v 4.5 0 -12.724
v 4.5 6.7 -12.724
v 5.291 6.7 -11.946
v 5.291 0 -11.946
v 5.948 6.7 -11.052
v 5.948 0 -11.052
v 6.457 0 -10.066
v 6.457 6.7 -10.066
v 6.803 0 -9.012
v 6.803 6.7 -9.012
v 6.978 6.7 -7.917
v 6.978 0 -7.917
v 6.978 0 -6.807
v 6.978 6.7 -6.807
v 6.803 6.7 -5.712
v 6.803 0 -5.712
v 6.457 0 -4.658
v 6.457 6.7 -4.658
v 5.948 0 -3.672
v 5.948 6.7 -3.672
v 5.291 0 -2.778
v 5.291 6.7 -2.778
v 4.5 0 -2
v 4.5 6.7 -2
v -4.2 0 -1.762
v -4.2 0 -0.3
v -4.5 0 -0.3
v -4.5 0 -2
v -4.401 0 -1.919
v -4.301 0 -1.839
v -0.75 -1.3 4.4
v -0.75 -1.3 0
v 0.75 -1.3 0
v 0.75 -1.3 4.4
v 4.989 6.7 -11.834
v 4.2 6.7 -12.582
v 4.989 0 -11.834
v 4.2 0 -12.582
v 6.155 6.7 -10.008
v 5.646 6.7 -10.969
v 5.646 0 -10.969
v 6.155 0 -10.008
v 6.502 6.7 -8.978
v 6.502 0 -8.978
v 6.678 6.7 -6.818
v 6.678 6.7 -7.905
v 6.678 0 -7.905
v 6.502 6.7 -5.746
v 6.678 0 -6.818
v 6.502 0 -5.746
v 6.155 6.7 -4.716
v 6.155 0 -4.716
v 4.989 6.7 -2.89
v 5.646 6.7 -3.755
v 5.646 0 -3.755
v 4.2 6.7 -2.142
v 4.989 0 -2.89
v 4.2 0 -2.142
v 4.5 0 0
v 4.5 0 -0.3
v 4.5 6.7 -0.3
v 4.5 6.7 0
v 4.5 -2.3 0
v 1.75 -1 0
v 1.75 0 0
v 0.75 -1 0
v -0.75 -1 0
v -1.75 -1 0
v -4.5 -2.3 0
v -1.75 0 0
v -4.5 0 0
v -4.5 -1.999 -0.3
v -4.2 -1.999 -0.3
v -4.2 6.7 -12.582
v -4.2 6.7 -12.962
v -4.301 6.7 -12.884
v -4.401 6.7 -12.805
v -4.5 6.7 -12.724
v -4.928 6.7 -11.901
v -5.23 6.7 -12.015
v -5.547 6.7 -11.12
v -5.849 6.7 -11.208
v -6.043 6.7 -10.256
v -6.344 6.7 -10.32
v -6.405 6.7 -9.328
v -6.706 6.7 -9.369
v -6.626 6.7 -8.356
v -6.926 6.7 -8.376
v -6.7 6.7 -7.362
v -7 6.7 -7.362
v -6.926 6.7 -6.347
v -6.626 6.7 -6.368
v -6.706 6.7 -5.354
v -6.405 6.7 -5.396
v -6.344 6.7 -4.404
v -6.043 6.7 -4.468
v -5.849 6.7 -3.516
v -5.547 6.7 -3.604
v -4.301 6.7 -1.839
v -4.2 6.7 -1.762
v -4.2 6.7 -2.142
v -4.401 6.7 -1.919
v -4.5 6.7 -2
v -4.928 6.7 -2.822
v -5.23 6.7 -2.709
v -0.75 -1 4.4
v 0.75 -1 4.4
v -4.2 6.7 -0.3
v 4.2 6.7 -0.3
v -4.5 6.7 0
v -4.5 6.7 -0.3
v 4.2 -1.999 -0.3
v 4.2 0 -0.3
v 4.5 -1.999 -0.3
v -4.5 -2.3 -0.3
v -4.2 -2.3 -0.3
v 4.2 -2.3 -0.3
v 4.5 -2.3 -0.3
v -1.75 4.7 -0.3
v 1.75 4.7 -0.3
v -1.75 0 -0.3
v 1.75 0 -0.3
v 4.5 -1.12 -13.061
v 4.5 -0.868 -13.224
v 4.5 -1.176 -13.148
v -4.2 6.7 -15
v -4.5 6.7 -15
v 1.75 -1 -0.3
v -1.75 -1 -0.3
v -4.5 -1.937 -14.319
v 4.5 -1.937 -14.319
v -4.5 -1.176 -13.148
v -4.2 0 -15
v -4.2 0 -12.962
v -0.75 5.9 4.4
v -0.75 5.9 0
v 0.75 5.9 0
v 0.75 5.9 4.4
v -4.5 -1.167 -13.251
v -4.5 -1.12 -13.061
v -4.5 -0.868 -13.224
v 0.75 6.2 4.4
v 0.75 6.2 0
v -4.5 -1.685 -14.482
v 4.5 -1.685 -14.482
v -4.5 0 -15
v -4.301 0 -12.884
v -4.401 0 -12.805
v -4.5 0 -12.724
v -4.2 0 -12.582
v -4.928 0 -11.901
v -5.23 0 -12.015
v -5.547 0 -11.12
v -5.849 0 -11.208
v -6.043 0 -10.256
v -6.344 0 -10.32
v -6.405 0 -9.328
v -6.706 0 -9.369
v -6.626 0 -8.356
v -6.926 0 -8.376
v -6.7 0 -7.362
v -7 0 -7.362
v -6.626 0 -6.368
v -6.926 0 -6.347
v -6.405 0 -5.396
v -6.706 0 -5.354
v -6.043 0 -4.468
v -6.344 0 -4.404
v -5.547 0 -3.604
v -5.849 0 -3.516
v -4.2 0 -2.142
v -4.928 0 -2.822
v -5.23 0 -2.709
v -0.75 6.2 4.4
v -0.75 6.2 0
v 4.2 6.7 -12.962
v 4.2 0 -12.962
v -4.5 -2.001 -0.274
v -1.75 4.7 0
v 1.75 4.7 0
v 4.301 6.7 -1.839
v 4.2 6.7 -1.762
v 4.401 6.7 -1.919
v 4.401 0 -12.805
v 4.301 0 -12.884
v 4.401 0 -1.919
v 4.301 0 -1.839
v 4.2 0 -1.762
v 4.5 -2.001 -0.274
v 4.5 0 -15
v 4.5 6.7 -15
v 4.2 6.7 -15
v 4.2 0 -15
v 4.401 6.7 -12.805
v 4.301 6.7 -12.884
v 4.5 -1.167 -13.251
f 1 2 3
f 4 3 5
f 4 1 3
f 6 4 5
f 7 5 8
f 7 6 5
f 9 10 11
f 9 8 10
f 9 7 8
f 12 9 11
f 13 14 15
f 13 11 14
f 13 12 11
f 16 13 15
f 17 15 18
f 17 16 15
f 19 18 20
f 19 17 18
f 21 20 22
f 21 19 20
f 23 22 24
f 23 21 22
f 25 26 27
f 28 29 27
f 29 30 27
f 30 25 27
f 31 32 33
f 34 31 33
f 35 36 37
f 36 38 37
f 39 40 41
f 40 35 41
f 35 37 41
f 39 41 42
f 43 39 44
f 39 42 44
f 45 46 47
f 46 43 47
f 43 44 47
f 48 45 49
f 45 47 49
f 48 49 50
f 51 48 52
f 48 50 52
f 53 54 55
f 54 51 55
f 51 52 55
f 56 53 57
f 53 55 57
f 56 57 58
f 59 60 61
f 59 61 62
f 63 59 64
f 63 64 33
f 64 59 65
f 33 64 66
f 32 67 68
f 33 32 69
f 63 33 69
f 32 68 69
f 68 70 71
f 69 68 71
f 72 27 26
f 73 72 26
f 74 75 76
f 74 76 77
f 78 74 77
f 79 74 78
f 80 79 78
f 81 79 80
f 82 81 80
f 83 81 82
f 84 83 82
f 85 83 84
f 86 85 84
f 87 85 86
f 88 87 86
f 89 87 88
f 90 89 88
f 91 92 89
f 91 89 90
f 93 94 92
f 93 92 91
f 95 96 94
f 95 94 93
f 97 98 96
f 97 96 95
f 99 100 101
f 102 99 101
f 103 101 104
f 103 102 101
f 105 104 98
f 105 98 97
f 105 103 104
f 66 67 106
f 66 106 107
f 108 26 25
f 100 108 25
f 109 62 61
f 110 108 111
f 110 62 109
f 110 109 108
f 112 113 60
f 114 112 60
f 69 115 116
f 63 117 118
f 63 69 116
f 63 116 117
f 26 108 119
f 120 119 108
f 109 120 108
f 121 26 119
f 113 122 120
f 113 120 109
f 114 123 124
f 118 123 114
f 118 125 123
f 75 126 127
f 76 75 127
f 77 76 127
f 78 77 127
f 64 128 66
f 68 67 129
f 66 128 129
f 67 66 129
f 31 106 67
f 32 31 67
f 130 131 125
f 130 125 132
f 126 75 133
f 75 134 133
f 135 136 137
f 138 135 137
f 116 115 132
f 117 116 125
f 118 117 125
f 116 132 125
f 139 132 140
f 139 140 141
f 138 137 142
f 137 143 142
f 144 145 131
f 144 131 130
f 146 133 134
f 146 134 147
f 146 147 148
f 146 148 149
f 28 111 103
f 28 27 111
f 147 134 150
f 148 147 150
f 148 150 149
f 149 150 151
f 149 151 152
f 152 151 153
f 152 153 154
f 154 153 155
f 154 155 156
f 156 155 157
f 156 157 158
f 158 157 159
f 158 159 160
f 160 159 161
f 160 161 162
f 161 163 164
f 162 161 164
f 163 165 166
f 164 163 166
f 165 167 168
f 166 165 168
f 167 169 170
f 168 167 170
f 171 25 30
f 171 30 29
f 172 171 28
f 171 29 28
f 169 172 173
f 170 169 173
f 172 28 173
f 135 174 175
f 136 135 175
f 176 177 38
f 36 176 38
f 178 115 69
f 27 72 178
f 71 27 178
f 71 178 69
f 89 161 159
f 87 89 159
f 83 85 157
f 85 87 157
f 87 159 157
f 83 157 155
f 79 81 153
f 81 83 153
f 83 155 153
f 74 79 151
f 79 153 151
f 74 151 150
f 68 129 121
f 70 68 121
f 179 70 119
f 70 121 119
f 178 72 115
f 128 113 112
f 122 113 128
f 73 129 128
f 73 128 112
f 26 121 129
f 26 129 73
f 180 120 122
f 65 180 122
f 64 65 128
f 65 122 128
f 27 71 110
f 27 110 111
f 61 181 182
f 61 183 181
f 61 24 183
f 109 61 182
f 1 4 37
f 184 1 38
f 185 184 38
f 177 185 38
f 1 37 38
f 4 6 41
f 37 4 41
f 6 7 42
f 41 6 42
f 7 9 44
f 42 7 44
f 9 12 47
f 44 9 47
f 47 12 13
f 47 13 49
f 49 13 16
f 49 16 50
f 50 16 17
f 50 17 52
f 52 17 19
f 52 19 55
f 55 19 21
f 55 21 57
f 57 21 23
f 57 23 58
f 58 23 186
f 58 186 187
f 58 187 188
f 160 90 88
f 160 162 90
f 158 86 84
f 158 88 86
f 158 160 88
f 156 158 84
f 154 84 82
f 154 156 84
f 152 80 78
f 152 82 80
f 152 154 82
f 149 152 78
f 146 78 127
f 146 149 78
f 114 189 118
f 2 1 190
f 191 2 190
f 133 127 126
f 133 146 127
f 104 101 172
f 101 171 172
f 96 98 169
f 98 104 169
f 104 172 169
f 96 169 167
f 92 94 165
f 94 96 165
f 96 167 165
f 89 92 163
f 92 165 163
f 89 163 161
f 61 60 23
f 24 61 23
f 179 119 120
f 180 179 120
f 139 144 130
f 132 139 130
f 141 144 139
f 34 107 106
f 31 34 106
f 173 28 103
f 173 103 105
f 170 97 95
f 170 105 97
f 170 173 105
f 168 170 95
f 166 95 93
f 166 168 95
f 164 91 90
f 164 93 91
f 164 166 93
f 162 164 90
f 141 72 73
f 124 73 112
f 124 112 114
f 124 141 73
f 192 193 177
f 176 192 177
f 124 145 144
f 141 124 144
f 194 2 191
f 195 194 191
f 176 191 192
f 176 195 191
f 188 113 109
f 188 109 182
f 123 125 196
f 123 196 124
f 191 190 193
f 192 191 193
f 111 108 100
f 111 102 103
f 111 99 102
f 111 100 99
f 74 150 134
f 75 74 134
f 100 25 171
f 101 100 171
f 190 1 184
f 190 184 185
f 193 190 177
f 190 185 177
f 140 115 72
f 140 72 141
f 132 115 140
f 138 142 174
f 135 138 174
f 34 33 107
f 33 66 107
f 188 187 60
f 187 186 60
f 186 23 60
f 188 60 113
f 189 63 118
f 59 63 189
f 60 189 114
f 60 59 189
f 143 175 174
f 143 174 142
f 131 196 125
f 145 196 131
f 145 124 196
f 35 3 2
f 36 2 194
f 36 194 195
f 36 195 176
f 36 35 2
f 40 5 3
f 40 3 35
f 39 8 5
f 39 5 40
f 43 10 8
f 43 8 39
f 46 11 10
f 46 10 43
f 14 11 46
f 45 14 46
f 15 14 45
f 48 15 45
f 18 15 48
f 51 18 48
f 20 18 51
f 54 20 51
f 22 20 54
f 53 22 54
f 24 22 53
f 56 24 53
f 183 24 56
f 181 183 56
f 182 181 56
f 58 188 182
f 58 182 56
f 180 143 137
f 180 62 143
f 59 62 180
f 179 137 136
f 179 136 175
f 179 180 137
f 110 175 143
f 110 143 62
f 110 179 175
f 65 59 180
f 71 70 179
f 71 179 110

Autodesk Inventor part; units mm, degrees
sketch "スケッチ1" plane through (0, 0, 0) normal (0, 1, 0) x (-1, 0, 0)
  line L0 (4.5, -0.3) -> (-4.5, -0.3)
  line L1 (-4.5, -0.3) -> (-4.5, 0)
  line L2 (-4.5, 0) -> (4.5, 0)
  line L3 (4.5, 0) -> (4.5, -0.3)
  line L4 (9.7545, -2) -> (-9.7545, -2) construction
  line L5 (0, -25.3634) -> (0, 2.8638) construction
  circle A0 centre (0, -7.3619) radius 7
  circle A1 centre (0, -7.3619) radius 6.7
  line L6 (4.5, -0.3) -> (4.5, -2)
  line L7 (4.2, -0.3) -> (4.2, -2.1417)
  line L8 (-4.5, -0.3) -> (-4.5, -2)
  line L9 (-4.2, -0.3) -> (-4.2, -2.1417)
  line L10 (9.7545, -15) -> (-9.7545, -15) construction
  line L11 (4.5, -12.7238) -> (4.5, -15)
  line L12 (4.5, -15) -> (4.2, -15)
  line L13 (4.2, -12.5821) -> (4.2, -15)
  line L14 (-4.5, -12.7238) -> (-4.5, -15)
  line L15 (-4.5, -15) -> (-4.2, -15)
  line L16 (-4.2, -15) -> (-4.2, -12.5821)
  point P0 (0, 0)
  point P1 (0, 0)
  point P2 (0, -2)
  point P3 (0, -15)
  dimension "d0" = 9
  dimension "THIN" = 0.3
  dimension "d2" = 2
  dimension "d3" = 14
  dimension "d5" = 0.3
  dimension "d6" = 0.3
  dimension "d7" = 0.3
  dimension "d8" = 15
extrude "押し出し1" add sketch "スケッチ1" along normal blind 6.7 contours L6 A0 L7 L0 | L0 L1 L2 L3 | A0 L13 A1 L7 | L9 A0 L8 L0 | L9 A1 L16 A0 | L11 L12 L13 A0 | A0 L16 L15 L14
sketch "スケッチ2" plane through (0, 0, 0) normal (0, -1, 0) x (1, 0, 0)
  line L0 (4.5, 0) -> (4.5, -2) projected
  line L1 (-4.5, -2) -> (-4.5, 0) projected
  line L2 (4.5, 0) -> (-4.5, 0)
  line L3 (-4.5, 0) -> (-4.5, -0.3)
  line L4 (-4.5, -0.3) -> (4.5, -0.3)
  line L5 (4.5, -0.3) -> (4.5, 0)
  line L6 (4.2, -0.3) -> (-4.2, -0.3) projected
  point P0 (0, 0)
  point P1 (4.5, -0.3)
extrude "押し出し2" add sketch "スケッチ2" along normal blind 2.3
ref_plane "作業平面1" through (-4.5, -2.3, -0.3) normal (0, 0.9962, 0.0872) x (1, 0, 0)
sketch "スケッチ3" plane through (-4.5, -2.3, -0.3) normal (0, 0.9962, 0.0872) x (1, 0, 0)
  line L0 (0, 0) -> (9, 0) projected
  line L1 (9, 0) -> (0, 0)
  line L2 (0, 0) -> (0, 13)
  line L3 (0, 13) -> (9, 13)
  line L4 (9, 13) -> (9, 0)
  point P0 (4.5, -0.0984)
  dimension "d14" = 13
extrude "押し出し3" add sketch "スケッチ3" along normal blind 0.3
ref_plane "作業平面2" through (4.5, -0.8681, -13.2244) normal (0, -0.8387, 0.5446) x (-1, 0, 0)
sketch "スケッチ4" plane through (4.5, -0.8681, -13.2244) normal (0, -0.8387, 0.5446) x (-1, 0, 0)
  line L0 (9, 0) -> (9, -10.2235) projected
  line L1 (9, 0) -> (0, 0)
  line L2 (0, 0) -> (0, 1.5)
  line L3 (0, 1.5) -> (9, 1.5)
  line L4 (9, 1.5) -> (9, 0)
  point P0 (4.5, -11.5637)
  dimension "d18" = 1.5
extrude "押し出し4" add sketch "スケッチ4" along normal blind 0.3
sketch "スケッチ5" plane through (4.2, 6.7, -0.3) normal (0, 0, -1) x (-1, 0, 0)
  line L0 (5.95, -2) -> (2.45, -2)
  line L1 (2.45, -2) -> (2.45, -7.7)
  line L2 (2.45, -7.7) -> (5.95, -7.7)
  line L3 (5.95, -7.7) -> (5.95, -2)
  line L4 (0, 0) -> (8.4, 0) projected
  point P0 (4.2, -6.7)
  point P1 (4.2, -7.7)
  dimension "d21" = 2
  dimension "d22" = 3.5
  dimension "d23" = 5.7
extrude "押し出し5" cut sketch "スケッチ5" against normal through all
sketch "スケッチ7" plane through (-1.75, -1, -0.3) normal (0, 1, 0) x (1, 0, 0)
  line L0 (3.5, -0.3) -> (0, -0.3) projected
  line L1 (1, -0.3) -> (2.5, -0.3)
  line L2 (2.5, -0.3) -> (2.5, -4.7)
  line L3 (2.5, -4.7) -> (1, -4.7)
  line L4 (1, -4.7) -> (1, -0.3)
  point P0 (1.75, -0.3)
  point P1 (1.75, -0.3)
  dimension "d30" = 1.5
  dimension "d31" = 4.4
extrude "押し出し7" add sketch "スケッチ7" against normal blind 0.3
ref_plane "作業平面3" through (0, 6.2, 0) normal (0, 1, 0) x (1, 0, 0)
sketch "スケッチ8" plane through (0, 6.2, 0) normal (0, 1, 0) x (1, 0, 0)
  line L0 (4.5, 0) -> (-4.5, 0) projected
  line L1 (-0.75, 0) -> (0.75, 0)
  line L2 (0.75, 0) -> (0.75, -4.4)
  line L3 (0.75, -4.4) -> (-0.75, -4.4)
  line L4 (-0.75, -4.4) -> (-0.75, 0)
  line L5 (-4.5, 0) -> (4.5, 0) projected
  point P0 (0, 0)
  point P1 (0, -4.4)
  point P2 (0, 0)
  dimension "d35" = 1.5
  dimension "d36" = 4.4
extrude "押し出し8" add sketch "スケッチ8" against normal blind 0.3
equation "\"d5\" = THIN"
equation "\"d6\" = THIN"
equation "\"d7\" = THIN"
equation "\"d15\" = THIN"
equation "\"d19\" = THIN"
equation "\"d32\" = THIN"
equation "\"d37\" = THIN"
properties part number "AA-Cell-Holder"
